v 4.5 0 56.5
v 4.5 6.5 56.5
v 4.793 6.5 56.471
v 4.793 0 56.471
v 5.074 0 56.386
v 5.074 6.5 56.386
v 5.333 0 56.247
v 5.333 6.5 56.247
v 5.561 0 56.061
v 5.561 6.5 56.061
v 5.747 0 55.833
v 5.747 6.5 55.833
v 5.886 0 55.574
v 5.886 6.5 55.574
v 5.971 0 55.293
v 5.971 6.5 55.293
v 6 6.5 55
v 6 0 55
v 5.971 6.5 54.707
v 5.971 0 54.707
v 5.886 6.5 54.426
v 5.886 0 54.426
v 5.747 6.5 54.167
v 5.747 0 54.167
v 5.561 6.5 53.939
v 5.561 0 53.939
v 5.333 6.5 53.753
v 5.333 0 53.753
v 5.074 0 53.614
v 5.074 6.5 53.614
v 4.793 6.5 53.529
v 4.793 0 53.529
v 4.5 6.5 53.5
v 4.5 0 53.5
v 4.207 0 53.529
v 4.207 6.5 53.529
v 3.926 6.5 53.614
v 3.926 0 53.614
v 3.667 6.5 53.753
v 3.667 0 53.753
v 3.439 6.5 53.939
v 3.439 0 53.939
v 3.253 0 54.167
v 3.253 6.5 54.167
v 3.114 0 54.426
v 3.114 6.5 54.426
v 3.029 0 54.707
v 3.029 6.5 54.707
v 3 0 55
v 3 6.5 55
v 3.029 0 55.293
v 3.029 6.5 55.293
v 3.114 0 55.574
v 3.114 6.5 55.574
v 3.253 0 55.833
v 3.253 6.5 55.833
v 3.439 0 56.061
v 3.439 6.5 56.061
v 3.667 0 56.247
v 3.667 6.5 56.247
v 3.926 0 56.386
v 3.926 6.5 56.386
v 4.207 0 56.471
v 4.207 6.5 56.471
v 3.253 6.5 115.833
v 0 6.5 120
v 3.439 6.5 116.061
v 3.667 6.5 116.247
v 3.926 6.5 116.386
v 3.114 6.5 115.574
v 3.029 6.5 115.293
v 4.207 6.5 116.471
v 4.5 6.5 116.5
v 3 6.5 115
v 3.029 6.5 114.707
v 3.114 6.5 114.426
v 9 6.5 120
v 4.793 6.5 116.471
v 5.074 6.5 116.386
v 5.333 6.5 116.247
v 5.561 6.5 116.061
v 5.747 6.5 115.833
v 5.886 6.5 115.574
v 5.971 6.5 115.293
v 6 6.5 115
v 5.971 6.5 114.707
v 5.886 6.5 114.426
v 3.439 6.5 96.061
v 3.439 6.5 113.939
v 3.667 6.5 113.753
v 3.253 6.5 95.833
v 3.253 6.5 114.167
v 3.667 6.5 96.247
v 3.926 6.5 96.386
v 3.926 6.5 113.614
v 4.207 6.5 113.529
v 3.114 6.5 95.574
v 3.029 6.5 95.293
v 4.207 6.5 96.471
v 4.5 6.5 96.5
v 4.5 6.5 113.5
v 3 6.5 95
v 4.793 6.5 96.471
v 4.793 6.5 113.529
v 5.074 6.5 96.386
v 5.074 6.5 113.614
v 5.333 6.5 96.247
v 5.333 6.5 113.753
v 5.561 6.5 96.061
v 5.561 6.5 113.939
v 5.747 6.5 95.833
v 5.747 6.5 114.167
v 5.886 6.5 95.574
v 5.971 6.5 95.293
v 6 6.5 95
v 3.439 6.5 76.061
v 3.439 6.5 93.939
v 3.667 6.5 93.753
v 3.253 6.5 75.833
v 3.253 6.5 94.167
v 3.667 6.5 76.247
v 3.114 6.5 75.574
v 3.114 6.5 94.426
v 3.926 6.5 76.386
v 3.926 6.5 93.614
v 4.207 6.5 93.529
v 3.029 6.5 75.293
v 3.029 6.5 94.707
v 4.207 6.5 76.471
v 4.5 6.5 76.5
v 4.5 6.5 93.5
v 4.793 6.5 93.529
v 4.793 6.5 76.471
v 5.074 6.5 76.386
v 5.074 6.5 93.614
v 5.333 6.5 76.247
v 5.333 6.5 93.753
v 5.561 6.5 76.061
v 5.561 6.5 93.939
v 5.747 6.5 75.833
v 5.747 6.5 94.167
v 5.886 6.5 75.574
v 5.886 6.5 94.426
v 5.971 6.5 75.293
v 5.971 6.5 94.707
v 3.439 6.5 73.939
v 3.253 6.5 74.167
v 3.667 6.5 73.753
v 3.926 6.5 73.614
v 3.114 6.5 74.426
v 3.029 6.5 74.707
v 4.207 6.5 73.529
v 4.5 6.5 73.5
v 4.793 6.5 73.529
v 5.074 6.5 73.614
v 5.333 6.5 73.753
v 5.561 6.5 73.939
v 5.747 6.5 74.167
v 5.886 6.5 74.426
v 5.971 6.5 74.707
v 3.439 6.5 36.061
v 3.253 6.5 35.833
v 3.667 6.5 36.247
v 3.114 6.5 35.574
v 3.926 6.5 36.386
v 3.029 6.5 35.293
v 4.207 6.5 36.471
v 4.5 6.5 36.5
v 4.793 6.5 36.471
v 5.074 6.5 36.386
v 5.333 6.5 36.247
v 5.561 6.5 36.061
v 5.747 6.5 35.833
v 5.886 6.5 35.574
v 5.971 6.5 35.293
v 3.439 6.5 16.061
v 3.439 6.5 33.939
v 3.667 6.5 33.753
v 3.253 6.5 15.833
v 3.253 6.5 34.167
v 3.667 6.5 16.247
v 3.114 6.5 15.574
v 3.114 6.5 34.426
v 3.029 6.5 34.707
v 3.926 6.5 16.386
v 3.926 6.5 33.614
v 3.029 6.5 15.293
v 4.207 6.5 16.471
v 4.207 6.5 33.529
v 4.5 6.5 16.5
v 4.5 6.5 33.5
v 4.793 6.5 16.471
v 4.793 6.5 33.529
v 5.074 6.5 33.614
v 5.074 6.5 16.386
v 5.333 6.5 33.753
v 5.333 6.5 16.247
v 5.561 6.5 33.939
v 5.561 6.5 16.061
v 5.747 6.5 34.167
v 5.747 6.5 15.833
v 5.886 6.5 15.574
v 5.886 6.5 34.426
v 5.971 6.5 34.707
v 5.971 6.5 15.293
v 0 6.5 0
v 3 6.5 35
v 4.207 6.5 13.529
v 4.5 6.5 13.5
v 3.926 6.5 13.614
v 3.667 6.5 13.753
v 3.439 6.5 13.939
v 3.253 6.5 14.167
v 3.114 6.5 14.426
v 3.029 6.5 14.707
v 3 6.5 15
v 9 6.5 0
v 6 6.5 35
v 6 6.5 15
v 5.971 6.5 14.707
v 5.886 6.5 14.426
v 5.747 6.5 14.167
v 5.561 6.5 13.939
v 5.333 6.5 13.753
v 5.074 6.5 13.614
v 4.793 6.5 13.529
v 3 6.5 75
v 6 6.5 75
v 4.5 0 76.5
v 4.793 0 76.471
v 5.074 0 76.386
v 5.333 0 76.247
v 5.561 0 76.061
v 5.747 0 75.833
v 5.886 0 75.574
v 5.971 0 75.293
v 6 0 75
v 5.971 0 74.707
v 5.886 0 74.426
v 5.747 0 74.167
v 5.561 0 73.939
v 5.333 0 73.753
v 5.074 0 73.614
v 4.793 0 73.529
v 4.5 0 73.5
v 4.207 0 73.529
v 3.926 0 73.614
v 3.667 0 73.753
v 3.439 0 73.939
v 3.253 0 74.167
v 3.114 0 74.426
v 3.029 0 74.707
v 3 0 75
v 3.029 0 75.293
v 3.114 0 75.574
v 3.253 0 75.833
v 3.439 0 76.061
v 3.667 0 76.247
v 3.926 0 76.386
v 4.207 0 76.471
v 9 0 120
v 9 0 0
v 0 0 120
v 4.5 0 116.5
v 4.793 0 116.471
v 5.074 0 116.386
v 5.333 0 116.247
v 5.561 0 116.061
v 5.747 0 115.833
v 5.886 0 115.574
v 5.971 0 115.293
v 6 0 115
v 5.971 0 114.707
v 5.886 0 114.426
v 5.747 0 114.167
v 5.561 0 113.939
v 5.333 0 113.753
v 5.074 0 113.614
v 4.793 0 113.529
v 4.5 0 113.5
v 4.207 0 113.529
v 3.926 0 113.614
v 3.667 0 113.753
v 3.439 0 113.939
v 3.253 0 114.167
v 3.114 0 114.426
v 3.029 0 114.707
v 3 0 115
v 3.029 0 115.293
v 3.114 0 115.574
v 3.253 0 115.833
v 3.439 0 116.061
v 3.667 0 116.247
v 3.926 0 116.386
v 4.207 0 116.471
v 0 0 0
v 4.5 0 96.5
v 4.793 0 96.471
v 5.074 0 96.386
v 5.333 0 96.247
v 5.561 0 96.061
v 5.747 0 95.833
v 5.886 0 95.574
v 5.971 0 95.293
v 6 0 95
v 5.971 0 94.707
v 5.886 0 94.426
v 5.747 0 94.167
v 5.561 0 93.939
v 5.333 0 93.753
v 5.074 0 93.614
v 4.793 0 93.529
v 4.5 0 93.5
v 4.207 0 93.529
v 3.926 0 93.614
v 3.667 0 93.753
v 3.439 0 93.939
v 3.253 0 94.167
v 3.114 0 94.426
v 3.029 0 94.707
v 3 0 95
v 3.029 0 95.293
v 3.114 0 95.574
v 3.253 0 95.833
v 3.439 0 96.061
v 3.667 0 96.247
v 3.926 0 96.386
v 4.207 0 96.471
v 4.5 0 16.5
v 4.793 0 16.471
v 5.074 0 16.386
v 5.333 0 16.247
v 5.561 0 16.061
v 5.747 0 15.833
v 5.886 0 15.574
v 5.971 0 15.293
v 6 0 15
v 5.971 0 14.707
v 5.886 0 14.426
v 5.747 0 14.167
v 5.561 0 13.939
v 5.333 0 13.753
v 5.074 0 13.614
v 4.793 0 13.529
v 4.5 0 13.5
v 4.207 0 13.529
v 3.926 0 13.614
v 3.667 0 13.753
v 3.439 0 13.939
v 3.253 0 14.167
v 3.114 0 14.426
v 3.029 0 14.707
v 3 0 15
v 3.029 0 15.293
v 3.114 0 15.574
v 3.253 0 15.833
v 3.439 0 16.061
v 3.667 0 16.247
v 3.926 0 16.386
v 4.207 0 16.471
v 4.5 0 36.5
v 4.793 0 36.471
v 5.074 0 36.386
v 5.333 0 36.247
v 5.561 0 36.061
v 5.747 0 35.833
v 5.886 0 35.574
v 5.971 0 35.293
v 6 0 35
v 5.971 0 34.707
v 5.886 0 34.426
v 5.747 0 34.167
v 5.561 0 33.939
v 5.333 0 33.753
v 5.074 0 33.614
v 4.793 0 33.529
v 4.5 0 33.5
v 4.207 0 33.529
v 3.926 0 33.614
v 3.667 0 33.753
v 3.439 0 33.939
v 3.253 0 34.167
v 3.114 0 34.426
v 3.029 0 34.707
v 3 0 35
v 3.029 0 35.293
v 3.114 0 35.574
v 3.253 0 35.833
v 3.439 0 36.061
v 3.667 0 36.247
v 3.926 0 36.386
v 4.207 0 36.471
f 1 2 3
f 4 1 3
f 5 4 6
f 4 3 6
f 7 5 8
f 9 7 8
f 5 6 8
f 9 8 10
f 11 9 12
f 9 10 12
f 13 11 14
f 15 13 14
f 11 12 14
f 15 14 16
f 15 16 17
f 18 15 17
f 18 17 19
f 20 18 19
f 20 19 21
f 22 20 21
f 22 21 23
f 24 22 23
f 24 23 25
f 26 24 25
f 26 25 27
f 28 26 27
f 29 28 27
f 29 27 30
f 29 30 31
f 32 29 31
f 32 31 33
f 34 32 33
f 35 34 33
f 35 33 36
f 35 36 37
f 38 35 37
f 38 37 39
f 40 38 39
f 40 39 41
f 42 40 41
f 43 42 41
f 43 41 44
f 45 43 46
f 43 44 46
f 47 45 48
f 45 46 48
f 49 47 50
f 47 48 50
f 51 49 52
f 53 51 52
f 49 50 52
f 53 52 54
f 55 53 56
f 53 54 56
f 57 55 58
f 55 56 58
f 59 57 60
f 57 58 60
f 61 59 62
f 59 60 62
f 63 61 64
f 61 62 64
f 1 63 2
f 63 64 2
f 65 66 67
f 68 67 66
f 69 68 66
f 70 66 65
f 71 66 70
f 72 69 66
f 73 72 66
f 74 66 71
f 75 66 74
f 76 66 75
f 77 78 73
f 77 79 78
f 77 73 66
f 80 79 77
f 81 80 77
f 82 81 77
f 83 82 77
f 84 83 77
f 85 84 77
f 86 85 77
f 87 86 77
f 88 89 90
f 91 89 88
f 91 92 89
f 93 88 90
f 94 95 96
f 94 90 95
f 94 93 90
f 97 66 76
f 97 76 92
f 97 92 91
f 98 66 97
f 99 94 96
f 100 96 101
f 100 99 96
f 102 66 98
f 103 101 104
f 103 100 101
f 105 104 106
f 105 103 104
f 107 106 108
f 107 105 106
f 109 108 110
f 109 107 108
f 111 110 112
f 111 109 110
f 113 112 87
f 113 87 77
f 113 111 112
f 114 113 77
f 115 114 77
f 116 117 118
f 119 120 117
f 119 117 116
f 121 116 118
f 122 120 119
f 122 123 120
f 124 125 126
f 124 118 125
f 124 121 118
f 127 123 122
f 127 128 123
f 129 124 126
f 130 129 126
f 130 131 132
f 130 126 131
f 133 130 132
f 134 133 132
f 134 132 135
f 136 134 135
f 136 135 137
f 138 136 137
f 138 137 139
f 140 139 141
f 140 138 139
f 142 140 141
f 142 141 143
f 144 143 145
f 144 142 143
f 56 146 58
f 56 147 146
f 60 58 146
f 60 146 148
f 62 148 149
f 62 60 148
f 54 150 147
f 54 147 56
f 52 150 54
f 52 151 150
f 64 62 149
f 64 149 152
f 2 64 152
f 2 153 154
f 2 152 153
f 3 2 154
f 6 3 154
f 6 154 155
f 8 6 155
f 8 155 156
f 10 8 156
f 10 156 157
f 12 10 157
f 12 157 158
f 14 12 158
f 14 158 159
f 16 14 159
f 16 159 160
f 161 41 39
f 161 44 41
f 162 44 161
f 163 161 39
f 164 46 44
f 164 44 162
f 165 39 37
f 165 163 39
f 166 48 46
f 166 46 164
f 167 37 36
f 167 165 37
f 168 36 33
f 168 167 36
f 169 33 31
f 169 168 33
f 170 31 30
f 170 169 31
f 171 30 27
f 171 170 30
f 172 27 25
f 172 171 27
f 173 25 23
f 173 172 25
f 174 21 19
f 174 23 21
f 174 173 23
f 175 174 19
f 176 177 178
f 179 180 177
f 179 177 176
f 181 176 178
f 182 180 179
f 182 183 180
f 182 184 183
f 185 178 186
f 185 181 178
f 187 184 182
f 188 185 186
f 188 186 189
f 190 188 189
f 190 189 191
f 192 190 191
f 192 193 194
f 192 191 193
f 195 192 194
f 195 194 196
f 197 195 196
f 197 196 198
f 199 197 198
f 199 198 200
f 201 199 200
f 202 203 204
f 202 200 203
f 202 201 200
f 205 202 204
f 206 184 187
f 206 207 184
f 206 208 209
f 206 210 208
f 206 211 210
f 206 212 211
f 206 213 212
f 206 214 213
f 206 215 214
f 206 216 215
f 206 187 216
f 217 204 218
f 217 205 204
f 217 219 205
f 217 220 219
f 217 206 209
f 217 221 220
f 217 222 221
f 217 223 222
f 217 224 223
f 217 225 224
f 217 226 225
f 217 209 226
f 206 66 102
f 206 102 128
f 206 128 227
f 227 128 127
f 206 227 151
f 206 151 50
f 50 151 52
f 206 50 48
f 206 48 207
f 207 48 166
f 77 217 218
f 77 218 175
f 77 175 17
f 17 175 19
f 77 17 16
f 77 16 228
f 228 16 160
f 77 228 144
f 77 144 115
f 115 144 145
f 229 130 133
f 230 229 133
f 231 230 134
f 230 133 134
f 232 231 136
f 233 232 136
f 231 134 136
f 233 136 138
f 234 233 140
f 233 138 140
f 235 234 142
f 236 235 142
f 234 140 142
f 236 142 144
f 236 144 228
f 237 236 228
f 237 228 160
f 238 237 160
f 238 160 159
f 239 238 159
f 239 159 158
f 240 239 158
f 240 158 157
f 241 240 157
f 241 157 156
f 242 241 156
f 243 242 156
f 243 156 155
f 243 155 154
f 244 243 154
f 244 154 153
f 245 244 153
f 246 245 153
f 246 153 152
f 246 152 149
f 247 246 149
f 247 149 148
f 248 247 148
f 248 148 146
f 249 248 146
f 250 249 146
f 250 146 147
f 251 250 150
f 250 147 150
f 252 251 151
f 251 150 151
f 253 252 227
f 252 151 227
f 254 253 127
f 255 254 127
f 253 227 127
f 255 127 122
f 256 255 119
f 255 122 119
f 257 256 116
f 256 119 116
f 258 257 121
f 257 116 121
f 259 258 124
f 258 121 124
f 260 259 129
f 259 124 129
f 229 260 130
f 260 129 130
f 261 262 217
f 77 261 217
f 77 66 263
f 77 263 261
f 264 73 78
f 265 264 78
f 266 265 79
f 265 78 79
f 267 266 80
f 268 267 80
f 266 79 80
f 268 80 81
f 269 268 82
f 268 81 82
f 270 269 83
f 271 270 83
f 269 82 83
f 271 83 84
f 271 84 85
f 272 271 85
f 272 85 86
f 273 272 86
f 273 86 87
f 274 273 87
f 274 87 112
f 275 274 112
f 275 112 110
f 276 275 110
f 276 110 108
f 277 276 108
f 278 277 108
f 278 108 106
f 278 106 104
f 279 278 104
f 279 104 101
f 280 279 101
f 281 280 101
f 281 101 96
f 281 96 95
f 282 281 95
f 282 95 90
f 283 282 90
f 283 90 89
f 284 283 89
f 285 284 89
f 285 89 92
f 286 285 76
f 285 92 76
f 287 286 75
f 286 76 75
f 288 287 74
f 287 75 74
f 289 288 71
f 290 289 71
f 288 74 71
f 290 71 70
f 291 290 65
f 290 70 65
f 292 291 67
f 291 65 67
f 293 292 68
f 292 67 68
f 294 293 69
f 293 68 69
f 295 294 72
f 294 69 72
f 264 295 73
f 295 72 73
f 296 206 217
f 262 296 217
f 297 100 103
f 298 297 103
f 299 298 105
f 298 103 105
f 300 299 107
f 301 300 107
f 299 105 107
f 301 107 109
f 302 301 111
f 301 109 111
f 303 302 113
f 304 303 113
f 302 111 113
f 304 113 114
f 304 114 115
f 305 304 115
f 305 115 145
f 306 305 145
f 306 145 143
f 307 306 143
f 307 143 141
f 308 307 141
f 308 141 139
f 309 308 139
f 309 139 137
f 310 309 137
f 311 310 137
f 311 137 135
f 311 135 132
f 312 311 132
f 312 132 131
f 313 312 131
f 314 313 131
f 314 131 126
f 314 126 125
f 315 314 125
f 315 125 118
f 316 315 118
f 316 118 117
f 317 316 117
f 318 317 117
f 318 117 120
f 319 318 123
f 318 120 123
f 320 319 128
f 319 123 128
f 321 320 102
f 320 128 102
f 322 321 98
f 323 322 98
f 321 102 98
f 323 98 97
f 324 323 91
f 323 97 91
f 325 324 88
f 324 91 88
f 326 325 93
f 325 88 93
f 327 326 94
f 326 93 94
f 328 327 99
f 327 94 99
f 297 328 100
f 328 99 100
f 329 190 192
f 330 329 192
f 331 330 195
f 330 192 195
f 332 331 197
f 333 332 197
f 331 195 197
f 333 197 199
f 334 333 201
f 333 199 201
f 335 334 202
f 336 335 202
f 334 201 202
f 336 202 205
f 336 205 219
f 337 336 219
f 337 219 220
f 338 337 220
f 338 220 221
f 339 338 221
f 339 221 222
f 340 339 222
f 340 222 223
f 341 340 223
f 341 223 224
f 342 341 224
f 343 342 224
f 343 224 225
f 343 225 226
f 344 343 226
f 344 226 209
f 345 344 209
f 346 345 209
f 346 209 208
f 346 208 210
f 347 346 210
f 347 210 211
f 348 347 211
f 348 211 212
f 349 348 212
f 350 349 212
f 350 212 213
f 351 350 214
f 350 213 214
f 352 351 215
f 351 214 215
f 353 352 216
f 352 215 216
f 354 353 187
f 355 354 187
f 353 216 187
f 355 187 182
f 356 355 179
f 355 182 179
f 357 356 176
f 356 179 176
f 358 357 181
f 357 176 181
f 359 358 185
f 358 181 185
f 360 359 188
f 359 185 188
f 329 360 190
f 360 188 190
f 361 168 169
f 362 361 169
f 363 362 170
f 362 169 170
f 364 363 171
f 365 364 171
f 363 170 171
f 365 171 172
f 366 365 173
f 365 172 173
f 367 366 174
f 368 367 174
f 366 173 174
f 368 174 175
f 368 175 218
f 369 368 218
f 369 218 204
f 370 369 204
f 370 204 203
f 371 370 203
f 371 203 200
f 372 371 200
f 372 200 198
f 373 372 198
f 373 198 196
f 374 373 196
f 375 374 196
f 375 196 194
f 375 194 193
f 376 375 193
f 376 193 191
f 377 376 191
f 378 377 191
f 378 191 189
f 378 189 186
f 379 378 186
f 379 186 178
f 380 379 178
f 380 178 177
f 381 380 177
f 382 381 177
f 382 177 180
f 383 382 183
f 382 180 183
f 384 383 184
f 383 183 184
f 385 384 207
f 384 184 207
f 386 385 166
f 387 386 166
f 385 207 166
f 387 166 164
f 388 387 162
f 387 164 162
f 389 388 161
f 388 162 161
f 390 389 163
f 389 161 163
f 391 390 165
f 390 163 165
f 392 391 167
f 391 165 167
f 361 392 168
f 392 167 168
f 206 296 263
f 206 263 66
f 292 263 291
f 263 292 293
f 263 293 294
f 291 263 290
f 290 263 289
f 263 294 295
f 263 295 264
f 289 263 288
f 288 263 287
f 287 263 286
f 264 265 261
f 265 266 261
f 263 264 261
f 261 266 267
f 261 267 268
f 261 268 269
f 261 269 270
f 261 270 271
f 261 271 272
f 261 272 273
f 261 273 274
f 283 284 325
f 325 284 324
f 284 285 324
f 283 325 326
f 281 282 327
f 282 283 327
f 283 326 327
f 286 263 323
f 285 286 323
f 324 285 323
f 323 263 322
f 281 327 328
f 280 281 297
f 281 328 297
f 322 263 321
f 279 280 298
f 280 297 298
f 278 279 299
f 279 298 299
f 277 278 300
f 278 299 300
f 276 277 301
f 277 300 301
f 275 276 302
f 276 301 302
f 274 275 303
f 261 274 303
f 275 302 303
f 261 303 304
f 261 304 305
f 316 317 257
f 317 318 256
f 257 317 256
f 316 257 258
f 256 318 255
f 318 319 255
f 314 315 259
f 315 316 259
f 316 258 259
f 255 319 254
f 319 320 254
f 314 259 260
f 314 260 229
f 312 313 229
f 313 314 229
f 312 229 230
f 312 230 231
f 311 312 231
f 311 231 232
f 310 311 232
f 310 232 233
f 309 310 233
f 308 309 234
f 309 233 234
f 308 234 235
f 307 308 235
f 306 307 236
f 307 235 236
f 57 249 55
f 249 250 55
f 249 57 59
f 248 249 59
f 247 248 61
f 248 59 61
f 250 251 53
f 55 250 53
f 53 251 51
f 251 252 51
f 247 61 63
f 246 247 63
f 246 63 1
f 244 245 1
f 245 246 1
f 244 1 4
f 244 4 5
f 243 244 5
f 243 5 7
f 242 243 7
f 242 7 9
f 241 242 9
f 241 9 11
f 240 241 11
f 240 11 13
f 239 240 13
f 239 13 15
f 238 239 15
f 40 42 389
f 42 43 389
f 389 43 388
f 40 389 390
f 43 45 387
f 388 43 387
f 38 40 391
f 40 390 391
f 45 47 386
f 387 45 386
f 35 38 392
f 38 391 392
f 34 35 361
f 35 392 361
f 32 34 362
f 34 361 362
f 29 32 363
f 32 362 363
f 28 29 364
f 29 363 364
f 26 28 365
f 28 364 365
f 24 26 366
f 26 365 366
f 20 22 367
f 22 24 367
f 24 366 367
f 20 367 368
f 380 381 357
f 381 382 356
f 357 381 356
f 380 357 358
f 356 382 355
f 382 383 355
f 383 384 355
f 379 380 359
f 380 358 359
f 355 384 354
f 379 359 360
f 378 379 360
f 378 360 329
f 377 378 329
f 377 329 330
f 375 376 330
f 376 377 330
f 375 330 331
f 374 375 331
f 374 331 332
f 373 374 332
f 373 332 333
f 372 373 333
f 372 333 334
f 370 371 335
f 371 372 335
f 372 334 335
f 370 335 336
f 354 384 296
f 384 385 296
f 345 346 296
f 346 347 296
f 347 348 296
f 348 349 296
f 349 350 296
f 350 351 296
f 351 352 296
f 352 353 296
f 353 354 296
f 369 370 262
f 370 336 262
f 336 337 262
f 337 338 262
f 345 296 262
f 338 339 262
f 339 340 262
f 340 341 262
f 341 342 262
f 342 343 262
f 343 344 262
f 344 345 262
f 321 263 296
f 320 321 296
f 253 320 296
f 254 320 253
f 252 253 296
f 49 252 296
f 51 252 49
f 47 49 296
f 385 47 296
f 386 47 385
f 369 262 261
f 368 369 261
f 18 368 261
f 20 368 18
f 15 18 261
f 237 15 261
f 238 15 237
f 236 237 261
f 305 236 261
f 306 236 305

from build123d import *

# Parameters (mm, degrees)
SKETCH_1_W          = 9
SKETCH_1_H          = 6.5
EXTRUDE_1_DEPTH     = 120
SKETCH_2_R          = 1.5
CUT_EXTRUDE_1_DEPTH = 100


with BuildPart() as part:
    # 草图1 → 凸台-拉伸1 (new body)
    with BuildSketch(Plane.XY):
        with Locations((4.5, 3.25)):
            Rectangle(SKETCH_1_W, SKETCH_1_H)
    extrude(amount=EXTRUDE_1_DEPTH)

    # 草图2 → 切除-拉伸1 (cut)
    with BuildSketch(Plane(origin=(0, 6.5, 0), x_dir=(1, 0, 0), z_dir=(0, 1, 0))):
        with Locations(Location((4.5, -115, 0), (0, 0, 270))):
            Circle(SKETCH_2_R)
        with Locations(Location((4.5, -95, 0), (0, 0, 270))):
            Circle(SKETCH_2_R)
        with Locations(Location((4.5, -75, 0), (0, 0, 270))):
            Circle(SKETCH_2_R)
        with Locations(Location((4.5, -55, 0), (0, 0, 270))):
            Circle(SKETCH_2_R)
        with Locations(Location((4.5, -35, 0), (0, 0, 270))):
            Circle(SKETCH_2_R)
        with Locations(Location((4.5, -15, 0), (0, 0, 270))):
            Circle(SKETCH_2_R)
    extrude(amount=-CUT_EXTRUDE_1_DEPTH, mode=Mode.SUBTRACT)


solid = part.part
